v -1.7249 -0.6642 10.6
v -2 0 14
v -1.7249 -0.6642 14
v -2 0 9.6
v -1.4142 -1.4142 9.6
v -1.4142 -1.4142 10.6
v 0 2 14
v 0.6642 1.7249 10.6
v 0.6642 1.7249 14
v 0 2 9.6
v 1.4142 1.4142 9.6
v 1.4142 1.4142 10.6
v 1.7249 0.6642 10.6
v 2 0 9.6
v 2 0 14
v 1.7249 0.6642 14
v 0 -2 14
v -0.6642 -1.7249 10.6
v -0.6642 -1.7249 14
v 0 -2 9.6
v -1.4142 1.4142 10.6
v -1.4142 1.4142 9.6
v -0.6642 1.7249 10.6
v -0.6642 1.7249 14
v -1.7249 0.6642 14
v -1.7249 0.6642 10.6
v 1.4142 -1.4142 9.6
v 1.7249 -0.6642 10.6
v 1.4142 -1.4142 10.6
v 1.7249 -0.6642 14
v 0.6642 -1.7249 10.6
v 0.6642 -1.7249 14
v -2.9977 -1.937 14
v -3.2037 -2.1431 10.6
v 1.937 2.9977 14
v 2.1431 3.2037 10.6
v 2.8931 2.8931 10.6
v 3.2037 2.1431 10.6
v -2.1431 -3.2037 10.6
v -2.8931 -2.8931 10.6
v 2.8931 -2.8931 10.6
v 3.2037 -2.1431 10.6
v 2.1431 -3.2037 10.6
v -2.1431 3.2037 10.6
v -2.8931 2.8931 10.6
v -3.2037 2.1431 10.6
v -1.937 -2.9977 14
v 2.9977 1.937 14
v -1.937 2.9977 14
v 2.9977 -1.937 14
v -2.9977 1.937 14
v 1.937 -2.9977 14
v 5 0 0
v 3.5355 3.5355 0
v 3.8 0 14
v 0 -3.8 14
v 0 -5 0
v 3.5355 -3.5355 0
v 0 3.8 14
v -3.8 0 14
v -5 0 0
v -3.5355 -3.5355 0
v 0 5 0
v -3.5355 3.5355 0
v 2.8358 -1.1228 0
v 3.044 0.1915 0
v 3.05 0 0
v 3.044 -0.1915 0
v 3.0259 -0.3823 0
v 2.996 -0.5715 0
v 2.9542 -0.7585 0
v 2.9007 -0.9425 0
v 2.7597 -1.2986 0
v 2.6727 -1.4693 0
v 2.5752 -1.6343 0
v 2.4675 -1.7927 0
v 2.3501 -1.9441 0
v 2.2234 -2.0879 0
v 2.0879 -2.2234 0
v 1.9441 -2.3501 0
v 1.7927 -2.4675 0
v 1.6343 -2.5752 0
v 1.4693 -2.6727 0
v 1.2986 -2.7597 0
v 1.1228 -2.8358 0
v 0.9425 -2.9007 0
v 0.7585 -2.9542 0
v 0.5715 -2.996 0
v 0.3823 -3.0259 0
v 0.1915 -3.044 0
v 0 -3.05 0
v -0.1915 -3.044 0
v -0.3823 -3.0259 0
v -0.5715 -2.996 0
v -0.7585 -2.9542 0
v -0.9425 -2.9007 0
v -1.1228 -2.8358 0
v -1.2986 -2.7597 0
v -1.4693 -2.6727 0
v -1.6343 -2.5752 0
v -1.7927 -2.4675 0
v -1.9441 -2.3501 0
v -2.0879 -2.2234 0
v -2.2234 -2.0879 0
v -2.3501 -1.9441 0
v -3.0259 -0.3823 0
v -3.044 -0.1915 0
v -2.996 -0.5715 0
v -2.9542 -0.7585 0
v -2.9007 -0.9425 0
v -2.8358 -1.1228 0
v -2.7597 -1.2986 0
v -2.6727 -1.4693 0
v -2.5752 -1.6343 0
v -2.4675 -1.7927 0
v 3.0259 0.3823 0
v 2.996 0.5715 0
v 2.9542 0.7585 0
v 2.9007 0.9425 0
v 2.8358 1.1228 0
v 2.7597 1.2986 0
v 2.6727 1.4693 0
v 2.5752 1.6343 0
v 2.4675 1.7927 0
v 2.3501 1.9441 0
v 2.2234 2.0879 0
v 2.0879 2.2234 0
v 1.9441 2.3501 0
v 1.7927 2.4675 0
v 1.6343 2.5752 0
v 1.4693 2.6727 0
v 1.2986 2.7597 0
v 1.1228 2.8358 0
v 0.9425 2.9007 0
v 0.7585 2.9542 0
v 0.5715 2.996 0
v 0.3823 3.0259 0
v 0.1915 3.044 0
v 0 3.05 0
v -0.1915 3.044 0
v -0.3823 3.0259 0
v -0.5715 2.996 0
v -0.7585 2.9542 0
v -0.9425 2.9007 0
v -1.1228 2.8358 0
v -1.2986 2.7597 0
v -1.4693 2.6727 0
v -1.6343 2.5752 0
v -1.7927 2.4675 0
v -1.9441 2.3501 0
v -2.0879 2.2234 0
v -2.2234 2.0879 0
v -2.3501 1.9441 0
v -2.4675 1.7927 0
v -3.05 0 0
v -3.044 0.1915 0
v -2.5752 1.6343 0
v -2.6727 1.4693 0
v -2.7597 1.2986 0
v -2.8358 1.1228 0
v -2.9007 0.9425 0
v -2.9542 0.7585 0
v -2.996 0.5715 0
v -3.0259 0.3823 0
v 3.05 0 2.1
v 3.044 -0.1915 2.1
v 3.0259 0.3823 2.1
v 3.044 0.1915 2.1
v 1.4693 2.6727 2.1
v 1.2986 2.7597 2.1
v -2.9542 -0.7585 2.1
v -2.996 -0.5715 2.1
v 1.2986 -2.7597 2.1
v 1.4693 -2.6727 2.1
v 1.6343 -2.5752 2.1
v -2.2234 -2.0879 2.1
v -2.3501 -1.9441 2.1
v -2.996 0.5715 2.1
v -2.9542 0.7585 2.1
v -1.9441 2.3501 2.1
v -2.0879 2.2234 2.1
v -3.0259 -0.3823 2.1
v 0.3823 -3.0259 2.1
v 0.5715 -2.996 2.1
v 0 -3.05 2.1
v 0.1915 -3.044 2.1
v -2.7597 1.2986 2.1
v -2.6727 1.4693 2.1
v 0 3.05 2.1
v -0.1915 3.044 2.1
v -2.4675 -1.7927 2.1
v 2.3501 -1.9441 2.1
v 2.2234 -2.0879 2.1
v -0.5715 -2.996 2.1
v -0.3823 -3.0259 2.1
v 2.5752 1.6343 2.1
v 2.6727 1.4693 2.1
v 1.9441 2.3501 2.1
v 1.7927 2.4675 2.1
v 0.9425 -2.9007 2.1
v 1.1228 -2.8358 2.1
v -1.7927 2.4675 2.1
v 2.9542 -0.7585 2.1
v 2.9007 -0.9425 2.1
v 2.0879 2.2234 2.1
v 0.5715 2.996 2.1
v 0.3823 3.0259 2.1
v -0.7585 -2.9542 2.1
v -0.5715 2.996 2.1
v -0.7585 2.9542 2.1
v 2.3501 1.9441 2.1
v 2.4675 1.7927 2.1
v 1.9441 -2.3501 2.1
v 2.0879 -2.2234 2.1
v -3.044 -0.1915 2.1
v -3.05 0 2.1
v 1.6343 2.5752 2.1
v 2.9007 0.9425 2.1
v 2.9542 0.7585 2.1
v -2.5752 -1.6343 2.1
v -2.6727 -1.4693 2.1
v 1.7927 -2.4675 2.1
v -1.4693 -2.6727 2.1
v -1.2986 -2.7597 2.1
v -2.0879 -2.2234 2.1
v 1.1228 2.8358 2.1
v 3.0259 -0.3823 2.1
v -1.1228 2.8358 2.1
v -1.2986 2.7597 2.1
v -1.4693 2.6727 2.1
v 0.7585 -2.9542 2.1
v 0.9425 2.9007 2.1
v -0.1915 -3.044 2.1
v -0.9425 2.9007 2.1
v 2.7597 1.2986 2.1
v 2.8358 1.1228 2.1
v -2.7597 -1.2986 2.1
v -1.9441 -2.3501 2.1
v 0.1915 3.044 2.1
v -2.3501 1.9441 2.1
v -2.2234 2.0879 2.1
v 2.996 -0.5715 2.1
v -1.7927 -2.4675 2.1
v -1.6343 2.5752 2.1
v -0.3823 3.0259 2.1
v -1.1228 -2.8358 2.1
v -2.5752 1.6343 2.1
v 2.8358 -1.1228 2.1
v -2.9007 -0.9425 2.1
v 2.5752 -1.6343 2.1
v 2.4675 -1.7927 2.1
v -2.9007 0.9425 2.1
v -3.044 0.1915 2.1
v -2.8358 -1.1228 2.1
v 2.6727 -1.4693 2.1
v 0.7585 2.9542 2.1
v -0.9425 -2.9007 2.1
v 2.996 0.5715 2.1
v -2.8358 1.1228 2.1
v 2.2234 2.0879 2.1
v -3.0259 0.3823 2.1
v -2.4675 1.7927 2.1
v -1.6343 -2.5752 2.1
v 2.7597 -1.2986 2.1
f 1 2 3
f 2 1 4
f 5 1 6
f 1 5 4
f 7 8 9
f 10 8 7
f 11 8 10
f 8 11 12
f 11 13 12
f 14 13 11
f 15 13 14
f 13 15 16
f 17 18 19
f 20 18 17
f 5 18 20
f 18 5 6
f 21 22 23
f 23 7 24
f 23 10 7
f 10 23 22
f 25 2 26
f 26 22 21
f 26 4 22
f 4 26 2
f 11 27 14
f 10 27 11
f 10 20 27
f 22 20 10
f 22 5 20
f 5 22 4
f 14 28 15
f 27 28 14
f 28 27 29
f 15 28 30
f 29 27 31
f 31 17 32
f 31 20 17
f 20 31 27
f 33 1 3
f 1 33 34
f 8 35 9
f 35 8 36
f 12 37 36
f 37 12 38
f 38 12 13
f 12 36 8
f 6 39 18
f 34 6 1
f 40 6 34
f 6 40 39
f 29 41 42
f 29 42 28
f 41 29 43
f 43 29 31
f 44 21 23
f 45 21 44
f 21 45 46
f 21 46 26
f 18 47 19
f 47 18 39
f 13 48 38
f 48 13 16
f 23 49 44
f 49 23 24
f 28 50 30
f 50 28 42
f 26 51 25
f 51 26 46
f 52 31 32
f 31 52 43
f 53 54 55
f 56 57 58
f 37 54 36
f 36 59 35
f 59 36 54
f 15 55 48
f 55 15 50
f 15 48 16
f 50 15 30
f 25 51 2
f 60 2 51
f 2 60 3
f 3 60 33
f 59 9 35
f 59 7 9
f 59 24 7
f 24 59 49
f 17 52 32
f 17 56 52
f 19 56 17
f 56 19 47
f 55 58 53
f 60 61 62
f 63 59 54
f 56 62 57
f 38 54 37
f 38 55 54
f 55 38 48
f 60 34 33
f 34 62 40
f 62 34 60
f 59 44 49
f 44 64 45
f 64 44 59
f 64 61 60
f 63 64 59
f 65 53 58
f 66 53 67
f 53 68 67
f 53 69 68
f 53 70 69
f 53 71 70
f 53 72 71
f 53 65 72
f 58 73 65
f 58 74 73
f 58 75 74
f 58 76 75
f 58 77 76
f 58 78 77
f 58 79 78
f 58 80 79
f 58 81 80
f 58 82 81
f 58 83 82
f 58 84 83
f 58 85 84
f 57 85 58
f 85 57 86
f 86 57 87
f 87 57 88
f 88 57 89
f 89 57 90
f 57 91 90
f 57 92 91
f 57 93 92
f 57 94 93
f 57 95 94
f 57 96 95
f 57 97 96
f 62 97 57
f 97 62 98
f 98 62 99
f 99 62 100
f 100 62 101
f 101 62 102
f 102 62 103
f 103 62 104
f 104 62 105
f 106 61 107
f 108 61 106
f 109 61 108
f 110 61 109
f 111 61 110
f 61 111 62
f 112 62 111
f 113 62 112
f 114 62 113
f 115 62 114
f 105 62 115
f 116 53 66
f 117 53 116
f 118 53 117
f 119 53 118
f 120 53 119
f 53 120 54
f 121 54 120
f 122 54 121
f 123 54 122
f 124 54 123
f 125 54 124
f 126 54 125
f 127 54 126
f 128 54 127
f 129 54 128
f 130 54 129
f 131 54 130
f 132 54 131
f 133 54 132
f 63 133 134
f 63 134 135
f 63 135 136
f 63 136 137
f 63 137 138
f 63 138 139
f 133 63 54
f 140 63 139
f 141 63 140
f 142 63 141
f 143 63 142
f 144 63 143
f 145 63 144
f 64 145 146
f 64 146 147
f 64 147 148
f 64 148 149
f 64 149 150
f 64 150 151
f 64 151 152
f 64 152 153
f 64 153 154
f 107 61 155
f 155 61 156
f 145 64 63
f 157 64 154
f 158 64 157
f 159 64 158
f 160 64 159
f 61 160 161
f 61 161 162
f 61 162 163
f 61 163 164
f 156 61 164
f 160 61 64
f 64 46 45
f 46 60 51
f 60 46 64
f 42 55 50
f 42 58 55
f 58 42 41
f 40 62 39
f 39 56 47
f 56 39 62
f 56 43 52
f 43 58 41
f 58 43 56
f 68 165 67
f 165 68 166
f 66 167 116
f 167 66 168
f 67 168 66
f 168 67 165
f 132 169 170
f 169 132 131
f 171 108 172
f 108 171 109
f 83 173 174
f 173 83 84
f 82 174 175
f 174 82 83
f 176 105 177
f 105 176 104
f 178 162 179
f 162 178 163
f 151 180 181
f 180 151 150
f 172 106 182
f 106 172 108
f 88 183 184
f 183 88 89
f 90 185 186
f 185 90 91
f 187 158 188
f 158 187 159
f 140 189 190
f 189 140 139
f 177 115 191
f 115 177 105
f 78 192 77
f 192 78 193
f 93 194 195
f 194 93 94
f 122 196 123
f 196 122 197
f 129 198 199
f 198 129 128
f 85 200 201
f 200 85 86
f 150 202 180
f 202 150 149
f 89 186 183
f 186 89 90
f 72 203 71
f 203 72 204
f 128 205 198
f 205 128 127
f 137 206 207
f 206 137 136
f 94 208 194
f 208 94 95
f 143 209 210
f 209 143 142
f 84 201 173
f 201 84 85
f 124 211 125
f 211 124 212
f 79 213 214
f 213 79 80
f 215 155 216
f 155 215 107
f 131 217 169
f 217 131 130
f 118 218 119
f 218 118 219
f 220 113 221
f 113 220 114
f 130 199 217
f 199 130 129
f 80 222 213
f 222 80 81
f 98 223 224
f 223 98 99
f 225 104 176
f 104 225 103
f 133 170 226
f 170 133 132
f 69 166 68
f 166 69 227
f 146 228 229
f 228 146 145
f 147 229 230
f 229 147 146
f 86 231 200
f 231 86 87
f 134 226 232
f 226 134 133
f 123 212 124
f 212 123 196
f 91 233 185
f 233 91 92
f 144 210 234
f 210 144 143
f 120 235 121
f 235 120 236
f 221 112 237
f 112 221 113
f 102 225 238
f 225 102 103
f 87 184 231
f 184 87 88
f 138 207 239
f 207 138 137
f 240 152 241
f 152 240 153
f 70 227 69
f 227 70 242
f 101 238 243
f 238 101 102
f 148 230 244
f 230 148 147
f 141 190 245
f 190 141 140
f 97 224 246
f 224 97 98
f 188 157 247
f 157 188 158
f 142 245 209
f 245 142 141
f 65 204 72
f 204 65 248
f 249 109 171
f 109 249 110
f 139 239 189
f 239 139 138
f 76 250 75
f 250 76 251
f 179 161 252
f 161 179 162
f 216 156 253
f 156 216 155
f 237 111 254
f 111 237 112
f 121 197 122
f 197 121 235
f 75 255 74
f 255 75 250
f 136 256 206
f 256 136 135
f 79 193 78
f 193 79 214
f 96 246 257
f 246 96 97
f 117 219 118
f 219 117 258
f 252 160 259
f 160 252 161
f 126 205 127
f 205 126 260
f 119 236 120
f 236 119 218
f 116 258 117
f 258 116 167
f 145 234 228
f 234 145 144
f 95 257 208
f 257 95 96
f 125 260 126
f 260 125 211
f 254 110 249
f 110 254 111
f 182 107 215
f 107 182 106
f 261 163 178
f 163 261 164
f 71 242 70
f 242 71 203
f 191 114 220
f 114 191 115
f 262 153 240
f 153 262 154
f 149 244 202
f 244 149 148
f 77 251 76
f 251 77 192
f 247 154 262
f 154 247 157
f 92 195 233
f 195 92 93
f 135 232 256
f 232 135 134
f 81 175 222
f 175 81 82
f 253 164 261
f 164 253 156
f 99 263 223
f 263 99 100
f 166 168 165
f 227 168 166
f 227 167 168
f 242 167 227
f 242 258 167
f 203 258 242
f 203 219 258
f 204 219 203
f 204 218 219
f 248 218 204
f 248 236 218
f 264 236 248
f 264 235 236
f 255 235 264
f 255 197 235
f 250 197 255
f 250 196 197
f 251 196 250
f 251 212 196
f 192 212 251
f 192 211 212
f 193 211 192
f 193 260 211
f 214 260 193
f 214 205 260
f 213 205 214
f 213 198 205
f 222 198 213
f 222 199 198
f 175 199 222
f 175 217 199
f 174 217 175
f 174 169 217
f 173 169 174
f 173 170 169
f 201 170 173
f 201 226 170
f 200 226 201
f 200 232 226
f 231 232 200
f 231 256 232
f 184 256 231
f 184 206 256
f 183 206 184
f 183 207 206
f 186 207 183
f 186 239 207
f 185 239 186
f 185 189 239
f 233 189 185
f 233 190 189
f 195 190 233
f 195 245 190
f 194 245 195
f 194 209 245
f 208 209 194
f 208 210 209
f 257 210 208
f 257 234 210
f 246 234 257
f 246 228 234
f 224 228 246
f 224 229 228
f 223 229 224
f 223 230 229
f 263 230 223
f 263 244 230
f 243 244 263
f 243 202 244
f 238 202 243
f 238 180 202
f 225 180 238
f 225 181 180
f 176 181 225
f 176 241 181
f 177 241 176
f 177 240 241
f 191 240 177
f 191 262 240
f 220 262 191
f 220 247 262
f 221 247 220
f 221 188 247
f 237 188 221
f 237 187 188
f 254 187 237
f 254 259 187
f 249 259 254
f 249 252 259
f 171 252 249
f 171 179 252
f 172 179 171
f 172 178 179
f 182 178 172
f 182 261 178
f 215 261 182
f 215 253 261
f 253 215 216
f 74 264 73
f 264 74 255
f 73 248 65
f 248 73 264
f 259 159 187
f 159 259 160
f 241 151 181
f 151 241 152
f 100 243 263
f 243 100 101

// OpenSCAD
/*
Rook Piece Generator (Věž)
*/

// Parameters
$fn = 8; // Polygon detail level

magnet_height = 2.1;        // Height of magnet
magnet_radius = 3.05;       // Radius of magnet

body_height = 14;           // Height of rook body
body_radius = 5;            // Base radius of rook body
top_taper = 1.2;            // Amount to taper toward top

crenellation_depth = 6;     // Depth of crenellation cut
crenellation_width = 1.5;   // Width of crenellation cuts
crenellation_shift = -0.4;  // Fine adjustment in Z position

transparency = 5;           // Transparency (visual only)
color_rgb = [143, 255, 61]; // RGB color

// Optional bounding cube for design envelope
module bounds() {
    color("red", 0.3)
        cube([6, 1, 17]); // Width × Depth × Height
}

// Rook model
module rook() {
    union() {
        color(color_rgb / 255, transparency) {
            // Body with top taper and crenellation cutouts
            difference() {
                // Main body
                cylinder(h = body_height, r1 = body_radius, r2 = body_radius - top_taper, center = false);
                
                // Crenellations
                translate([0, 0, body_height + crenellation_shift]) {
                    // Inner core cut (cylinder)
                    cylinder(h = crenellation_depth + 2, r = 2, center = true);

                    // Opposing side cube cuts
                    rotate(45, [0, 0, 1])
                        cube([10, crenellation_width, crenellation_depth], center = true);

                    rotate(315, [0, 0, 1])
                        cube([10, crenellation_width, crenellation_depth], center = true);
                }
            }
        }
    }
}

// Magnet cavity under the base
module magnet_cavity() {
    offset = 0.5; // Offset for printer tolerance
    translate([0, 0, -offset]) {
        color("yellow", transparency)
            cylinder(h = magnet_height + offset, r = magnet_radius, center = false, $fn = 100);
    }
}

// Final piece with magnet hole
difference() {
    rook();
    magnet_cavity();
}
